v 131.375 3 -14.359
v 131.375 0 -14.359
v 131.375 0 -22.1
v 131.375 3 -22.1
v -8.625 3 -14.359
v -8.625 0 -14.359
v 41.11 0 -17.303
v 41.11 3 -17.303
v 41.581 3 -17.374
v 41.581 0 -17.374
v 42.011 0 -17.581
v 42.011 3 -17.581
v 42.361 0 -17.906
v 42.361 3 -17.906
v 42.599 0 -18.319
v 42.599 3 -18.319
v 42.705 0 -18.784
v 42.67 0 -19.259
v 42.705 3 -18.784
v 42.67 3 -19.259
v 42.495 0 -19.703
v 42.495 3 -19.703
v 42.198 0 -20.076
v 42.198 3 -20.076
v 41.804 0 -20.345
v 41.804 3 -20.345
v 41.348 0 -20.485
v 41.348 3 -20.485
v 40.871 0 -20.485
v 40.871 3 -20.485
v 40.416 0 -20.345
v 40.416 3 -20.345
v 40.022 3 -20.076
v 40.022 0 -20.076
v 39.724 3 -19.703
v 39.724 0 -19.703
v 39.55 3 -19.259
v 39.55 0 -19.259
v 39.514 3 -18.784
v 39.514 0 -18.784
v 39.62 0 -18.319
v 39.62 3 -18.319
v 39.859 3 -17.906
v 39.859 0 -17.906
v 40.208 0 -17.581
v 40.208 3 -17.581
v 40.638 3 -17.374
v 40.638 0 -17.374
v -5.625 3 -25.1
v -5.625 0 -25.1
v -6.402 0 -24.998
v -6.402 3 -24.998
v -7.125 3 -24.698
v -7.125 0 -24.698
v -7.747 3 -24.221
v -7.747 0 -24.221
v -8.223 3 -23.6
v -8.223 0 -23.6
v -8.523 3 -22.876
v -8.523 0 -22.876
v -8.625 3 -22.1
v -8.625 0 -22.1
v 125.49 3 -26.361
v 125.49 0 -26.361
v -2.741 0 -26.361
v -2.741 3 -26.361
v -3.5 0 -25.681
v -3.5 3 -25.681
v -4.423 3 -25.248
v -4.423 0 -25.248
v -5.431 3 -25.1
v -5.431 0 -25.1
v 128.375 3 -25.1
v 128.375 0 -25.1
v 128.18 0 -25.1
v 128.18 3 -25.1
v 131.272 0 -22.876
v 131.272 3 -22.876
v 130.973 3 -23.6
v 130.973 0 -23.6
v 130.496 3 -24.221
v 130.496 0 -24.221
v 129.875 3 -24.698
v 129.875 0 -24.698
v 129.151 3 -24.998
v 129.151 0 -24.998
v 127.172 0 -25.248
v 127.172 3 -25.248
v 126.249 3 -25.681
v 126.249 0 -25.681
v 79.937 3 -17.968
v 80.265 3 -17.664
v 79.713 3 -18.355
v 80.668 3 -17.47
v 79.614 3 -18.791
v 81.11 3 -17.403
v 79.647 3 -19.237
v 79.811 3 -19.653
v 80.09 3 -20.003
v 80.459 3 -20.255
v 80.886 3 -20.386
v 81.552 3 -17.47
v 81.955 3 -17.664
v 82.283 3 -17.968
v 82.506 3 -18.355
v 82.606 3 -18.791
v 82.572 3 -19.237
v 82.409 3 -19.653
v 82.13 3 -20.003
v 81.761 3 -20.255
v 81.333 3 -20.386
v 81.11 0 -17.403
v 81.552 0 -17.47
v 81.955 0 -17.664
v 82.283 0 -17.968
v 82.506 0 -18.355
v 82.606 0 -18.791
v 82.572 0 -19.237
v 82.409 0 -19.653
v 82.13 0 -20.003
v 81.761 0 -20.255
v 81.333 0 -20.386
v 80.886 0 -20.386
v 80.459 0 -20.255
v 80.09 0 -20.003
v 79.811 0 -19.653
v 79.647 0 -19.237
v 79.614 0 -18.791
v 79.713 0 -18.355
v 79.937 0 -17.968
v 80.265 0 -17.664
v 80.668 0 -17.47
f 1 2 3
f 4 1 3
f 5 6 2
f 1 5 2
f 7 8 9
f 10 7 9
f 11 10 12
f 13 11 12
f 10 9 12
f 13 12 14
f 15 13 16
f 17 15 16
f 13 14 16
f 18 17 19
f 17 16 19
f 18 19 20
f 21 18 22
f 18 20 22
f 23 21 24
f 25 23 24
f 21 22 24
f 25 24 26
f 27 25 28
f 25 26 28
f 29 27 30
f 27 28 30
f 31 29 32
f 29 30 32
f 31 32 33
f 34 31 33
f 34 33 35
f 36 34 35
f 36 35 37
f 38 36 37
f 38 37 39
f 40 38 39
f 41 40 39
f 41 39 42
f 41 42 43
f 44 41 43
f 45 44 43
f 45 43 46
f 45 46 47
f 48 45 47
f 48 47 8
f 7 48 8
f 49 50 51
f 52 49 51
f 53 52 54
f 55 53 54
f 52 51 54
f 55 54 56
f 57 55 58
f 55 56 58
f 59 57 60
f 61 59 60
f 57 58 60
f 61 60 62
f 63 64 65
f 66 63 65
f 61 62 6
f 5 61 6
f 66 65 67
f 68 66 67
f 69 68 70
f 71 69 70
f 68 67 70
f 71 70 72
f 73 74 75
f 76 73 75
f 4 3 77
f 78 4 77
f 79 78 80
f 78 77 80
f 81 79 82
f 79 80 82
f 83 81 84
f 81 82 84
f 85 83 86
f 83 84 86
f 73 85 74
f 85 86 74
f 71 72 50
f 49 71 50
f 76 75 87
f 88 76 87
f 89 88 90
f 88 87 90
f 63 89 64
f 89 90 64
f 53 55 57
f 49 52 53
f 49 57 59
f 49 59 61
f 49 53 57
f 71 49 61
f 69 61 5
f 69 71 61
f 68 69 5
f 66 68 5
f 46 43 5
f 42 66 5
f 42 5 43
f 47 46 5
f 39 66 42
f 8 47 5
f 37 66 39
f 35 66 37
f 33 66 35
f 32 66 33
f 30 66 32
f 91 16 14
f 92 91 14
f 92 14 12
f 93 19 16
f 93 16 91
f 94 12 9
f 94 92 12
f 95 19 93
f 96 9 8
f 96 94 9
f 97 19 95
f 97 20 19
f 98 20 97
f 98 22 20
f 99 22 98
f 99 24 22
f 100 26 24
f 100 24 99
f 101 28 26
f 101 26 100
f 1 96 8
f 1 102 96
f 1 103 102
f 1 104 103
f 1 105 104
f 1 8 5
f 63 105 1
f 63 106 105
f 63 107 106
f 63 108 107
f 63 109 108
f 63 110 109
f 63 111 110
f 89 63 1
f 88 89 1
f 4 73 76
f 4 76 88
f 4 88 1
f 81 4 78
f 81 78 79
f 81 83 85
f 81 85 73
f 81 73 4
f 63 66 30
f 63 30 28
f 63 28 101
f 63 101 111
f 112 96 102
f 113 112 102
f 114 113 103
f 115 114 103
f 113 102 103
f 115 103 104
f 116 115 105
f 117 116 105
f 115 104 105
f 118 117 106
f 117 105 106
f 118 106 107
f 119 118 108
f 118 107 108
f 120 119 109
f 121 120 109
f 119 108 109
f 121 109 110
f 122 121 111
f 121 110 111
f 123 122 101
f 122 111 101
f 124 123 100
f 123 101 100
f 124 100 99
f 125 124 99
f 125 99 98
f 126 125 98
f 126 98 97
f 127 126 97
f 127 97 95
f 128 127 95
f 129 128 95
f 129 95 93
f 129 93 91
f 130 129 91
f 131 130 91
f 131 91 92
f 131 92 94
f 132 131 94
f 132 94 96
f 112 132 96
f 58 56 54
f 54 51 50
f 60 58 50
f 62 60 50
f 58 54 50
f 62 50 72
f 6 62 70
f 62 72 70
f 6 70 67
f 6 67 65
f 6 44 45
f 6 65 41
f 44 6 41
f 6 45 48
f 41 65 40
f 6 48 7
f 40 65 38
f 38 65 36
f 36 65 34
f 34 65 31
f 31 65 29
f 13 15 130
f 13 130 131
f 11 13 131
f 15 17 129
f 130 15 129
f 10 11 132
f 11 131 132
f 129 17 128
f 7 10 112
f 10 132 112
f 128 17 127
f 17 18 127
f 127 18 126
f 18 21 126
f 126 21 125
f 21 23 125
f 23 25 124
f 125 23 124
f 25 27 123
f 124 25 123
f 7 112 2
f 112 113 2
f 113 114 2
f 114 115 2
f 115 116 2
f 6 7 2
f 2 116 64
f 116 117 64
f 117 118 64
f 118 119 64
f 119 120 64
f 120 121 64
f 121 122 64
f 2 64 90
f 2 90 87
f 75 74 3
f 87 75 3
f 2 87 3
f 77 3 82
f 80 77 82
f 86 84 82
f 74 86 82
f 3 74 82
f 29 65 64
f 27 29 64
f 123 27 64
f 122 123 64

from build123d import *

# Parameters (mm, degrees)
BOSS_EXTRUDE1_DEPTH = 3
CUT_EXTRUDE1_REACH  = 136.027
SKETCH4_R           = 1.5


with BuildPart() as part:
    # Sketch3 → Boss-Extrude1 (new body)
    with BuildSketch(Plane(origin=(0, 0, 0), x_dir=(1, 0, 0), z_dir=(0, 1, 0))):
        with BuildLine():
            Line((125.49028015, 26.360794257), (-2.74094445, 26.360794257))
            ThreePointArc((-2.74094445, 26.360794257), (-3.945556452, 25.430743303), (-5.431022837, 25.099874039))
            Line((-5.431022837, 25.099874039), (-5.62533215, 25.099874039))
            ThreePointArc((-5.62533215, 25.099874039), (-7.746652493, 24.221194382), (-8.62533215, 22.099874039))
            Line((-8.62533215, 22.099874039), (-8.62533215, 14.358894177))
            Line((-8.62533215, 14.358894177), (131.37466785, 14.358894177))
            Line((131.37466785, 14.358894177), (131.37466785, 22.099874039))
            ThreePointArc((131.37466785, 22.099874039), (130.495988194, 24.221194382), (128.37466785, 25.099874039))
            Line((128.37466785, 25.099874039), (128.180358538, 25.099874039))
            ThreePointArc((128.180358538, 25.099874039), (126.694892152, 25.430743303), (125.49028015, 26.360794257))
        make_face()
    extrude(amount=BOSS_EXTRUDE1_DEPTH)

    # Sketch4 → Cut-Extrude1 (cut, up to next)
    with BuildSketch(Plane(origin=(0, 3, 0), x_dir=(1, 0, 0), z_dir=(0, 1, 0)), mode=Mode.PRIVATE) as cut_extrude1_sk1:
        with Locations(Location((81.109797099, 18.903114067, 0), (0, 0, 270))):
            Circle(SKETCH4_R)
    cut_extrude1_tool1 = extrude(cut_extrude1_sk1.sketch, amount=-CUT_EXTRUDE1_REACH, mode=Mode.PRIVATE) & part.part
    # Sketch4 → Cut-Extrude1 (cut, up to next)
    with BuildSketch(Plane(origin=(0, 3, 0), x_dir=(1, 0, 0), z_dir=(0, 1, 0)), mode=Mode.PRIVATE) as cut_extrude1_sk2:
        with BuildLine():
            ThreePointArc((41.109797099, 20.503114067), (39.509797099, 18.903114067), (41.109797099, 17.303114067))
            ThreePointArc((41.109797099, 17.303114067), (42.709797099, 18.903114067), (41.109797099, 20.503114067))
        make_face()
    cut_extrude1_tool2 = extrude(cut_extrude1_sk2.sketch, amount=-CUT_EXTRUDE1_REACH, mode=Mode.PRIVATE) & part.part
    add(cut_extrude1_tool1.solids().sort_by_distance((81.109797, 3, -18.903114))[0], mode=Mode.SUBTRACT)
    add(cut_extrude1_tool2.solids().sort_by_distance((41.109797, 3, -18.903114))[0], mode=Mode.SUBTRACT)


solid = part.part
